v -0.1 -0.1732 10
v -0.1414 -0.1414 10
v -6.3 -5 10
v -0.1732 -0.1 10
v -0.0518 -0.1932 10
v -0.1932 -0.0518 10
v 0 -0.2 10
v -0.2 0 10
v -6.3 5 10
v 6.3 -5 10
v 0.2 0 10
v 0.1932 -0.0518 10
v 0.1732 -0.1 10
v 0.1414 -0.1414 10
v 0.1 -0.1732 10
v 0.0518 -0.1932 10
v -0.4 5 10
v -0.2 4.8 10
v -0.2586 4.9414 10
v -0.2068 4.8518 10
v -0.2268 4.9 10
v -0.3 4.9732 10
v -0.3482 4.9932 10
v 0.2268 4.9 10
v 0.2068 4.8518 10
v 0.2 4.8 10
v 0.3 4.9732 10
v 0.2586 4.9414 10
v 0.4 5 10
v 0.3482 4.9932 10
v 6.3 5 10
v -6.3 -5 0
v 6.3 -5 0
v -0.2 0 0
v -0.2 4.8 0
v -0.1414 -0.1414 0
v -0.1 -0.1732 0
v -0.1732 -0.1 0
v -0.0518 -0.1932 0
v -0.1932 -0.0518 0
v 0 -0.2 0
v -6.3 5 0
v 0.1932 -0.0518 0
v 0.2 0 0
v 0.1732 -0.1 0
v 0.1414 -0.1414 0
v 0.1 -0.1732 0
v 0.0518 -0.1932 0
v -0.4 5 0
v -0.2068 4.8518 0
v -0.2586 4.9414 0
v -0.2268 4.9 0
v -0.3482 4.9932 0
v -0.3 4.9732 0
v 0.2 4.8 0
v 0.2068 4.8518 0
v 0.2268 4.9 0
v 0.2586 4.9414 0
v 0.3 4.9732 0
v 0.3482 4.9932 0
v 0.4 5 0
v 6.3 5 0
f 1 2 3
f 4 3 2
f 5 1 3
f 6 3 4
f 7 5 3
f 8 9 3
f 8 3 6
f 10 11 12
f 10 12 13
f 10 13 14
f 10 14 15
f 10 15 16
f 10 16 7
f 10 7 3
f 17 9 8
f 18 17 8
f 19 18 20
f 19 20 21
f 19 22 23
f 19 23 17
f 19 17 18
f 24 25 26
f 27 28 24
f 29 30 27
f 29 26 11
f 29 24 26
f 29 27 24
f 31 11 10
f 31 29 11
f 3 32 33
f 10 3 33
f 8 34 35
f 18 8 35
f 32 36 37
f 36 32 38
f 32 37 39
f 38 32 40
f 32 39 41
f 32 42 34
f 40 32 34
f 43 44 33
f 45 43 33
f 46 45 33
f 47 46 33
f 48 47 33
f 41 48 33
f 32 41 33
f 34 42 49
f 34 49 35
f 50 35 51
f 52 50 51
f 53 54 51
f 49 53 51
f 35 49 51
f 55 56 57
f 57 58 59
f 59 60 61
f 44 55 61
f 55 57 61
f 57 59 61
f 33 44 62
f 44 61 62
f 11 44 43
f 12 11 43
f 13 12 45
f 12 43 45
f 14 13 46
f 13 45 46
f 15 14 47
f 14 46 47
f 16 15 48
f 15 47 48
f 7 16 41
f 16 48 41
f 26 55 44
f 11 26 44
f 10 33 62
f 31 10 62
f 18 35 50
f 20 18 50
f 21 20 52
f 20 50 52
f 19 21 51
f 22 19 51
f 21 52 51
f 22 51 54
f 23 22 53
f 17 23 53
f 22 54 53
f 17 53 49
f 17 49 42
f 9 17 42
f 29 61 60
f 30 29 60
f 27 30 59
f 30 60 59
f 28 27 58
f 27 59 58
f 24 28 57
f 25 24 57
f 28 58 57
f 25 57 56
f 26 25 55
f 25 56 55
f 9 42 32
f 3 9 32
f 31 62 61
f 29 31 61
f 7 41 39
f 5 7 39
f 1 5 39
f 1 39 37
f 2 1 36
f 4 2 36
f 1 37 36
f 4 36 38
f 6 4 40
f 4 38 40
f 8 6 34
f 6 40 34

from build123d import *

# Parameters (mm, degrees)
F1_DEPTH = 10


# Not quite as in the source:
# - ends of sketch curves that miss each other by under 0.0002 mm in the source are joined


with BuildPart() as f1:
    # F0 (on Top) → F1 (new body)
    with BuildSketch(Plane.XY):
        with BuildLine():
            Line((-0.3999973293, 5), (-6.2999973293, 5))
            Line((-6.2999973293, 5), (-6.2999973293, -5))
            Line((-6.2999973293, -5), (6.3, -5))
            Line((6.3, -5), (6.3, 5))
            Line((6.3, 5), (0.4, 5))
            ThreePointArc((0.4, 5), (0.2585786438, 4.9414213562), (0.2, 4.8))
            Line((0.2, 4.8), (0.2, 0))
            ThreePointArc((0.2, 0), (0.1414213562, -0.1414213562), (0, -0.2))
            ThreePointArc((0, -0.2), (-0.1414186856, -0.1414213562), (-0.1999973293, 0))
            Line((-0.1999973293, 0), (-0.1999973293, 4.8))
            ThreePointArc((-0.1999973293, 4.8), (-0.2585759731, 4.9414213562), (-0.3999973293, 5))
        make_face()
    extrude(amount=F1_DEPTH)


solid = f1.part
